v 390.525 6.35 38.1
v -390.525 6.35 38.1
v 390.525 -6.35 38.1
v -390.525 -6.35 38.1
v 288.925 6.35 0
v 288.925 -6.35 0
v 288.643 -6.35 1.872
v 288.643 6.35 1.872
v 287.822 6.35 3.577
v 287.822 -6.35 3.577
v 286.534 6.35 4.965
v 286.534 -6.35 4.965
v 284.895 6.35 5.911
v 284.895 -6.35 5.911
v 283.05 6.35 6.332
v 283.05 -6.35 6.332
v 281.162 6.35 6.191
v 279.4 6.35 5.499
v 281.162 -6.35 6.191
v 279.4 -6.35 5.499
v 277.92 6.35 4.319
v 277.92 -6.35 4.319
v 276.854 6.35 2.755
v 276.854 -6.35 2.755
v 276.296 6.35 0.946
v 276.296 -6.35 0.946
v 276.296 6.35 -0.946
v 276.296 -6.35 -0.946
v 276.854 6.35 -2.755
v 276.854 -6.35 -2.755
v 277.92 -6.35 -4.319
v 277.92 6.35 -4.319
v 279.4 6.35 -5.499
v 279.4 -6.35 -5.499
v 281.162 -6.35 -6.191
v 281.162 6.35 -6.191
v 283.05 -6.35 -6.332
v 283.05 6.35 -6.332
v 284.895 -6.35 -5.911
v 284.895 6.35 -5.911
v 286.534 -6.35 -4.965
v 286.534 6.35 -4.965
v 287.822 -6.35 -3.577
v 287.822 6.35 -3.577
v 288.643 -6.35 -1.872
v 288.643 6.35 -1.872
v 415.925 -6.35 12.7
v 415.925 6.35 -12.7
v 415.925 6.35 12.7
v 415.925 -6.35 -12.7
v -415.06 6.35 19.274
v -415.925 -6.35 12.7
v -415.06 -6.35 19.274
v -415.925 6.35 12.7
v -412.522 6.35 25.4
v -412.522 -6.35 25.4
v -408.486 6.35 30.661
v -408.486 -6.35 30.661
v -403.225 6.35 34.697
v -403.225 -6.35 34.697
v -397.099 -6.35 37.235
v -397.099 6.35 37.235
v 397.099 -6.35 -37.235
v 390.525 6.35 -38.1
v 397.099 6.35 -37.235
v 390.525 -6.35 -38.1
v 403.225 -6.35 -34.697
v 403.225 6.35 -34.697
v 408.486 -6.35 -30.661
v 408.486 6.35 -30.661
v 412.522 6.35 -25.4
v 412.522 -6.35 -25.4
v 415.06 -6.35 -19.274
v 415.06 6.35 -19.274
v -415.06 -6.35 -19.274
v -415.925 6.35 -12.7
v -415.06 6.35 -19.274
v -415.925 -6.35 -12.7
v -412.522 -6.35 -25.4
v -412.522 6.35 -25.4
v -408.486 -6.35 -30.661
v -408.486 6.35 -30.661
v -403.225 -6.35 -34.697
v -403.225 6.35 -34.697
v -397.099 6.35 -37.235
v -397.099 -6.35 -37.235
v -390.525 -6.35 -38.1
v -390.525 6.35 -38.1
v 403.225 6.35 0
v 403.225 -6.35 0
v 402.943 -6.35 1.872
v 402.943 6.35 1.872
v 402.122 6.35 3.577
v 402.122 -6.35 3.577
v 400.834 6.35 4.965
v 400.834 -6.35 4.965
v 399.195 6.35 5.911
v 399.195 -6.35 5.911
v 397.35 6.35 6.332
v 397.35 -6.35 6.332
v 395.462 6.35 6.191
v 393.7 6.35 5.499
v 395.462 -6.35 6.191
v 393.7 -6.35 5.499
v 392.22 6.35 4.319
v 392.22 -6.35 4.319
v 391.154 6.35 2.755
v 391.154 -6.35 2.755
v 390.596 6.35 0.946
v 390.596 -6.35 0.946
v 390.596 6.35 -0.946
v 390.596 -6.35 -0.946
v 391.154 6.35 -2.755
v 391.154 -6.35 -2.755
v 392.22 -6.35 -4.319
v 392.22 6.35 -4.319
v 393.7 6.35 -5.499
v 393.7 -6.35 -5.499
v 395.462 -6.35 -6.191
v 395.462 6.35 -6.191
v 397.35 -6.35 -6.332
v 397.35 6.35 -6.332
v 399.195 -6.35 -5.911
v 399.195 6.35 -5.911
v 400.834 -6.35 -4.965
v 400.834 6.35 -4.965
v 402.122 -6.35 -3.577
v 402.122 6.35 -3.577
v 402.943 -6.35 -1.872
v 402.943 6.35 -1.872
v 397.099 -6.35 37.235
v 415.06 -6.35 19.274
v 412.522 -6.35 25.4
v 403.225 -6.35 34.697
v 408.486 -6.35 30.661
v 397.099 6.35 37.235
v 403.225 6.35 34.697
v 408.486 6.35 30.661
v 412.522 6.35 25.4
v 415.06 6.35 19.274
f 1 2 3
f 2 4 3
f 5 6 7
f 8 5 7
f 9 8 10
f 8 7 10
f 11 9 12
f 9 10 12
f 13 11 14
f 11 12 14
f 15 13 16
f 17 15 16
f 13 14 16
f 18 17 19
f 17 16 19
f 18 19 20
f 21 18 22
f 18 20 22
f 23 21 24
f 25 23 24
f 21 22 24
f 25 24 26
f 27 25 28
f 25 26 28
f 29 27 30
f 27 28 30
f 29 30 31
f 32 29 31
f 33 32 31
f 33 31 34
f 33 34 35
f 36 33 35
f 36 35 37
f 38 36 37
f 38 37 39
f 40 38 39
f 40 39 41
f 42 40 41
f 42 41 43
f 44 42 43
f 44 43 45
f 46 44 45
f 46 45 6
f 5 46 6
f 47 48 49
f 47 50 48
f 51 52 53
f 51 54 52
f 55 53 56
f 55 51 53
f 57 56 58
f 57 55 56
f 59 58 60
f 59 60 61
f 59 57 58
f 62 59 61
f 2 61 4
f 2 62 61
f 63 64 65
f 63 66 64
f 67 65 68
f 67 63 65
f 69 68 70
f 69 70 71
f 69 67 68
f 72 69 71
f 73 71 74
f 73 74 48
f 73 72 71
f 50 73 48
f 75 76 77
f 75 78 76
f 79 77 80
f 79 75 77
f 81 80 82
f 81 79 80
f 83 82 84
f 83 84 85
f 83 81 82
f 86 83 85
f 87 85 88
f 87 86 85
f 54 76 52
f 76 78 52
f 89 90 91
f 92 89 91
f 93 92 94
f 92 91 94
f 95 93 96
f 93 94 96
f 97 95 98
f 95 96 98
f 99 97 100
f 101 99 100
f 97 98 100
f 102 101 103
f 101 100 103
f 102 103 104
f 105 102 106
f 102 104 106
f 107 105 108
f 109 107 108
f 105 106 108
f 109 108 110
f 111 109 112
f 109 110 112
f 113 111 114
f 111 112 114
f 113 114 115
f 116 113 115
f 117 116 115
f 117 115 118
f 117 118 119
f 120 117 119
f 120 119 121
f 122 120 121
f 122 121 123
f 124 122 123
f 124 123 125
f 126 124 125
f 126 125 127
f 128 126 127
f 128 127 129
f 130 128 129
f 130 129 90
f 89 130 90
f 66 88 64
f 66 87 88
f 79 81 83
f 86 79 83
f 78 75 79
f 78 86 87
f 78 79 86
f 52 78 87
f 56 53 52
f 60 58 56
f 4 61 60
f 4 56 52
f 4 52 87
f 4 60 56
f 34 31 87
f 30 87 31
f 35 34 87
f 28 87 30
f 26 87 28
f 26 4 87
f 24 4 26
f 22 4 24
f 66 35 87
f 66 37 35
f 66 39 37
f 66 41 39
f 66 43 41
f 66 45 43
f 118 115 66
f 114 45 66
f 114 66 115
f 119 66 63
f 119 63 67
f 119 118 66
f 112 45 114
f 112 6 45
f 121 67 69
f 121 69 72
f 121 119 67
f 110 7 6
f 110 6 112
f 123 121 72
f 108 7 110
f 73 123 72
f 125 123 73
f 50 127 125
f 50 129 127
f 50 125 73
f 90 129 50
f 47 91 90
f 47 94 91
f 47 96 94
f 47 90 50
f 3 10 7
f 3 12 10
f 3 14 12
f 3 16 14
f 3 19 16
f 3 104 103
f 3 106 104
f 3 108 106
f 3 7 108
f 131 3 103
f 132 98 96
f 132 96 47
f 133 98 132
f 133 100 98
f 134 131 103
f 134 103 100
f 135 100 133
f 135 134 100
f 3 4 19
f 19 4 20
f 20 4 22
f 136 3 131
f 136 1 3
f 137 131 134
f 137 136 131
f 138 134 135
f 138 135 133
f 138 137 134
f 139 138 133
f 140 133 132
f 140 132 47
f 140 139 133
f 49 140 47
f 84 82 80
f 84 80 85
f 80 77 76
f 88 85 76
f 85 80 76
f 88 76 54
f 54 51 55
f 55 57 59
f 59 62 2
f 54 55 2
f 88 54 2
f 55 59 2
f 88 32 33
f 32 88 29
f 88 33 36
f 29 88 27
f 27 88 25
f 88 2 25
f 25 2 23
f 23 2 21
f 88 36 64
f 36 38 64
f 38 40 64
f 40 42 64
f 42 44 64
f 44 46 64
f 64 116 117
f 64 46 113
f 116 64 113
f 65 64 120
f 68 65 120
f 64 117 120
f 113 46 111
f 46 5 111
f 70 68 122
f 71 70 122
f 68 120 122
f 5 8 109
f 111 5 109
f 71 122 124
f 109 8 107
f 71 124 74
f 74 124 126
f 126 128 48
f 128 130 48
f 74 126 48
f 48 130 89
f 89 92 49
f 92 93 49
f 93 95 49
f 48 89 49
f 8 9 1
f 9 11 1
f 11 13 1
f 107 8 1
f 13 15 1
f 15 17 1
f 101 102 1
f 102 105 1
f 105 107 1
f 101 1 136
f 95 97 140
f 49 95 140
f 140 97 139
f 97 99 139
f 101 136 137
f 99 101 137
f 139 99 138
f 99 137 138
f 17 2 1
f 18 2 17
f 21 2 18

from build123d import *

# Parameters (mm, degrees)
F0_W     = 831.85
F0_H     = 76.2
F1_DEPTH = 6.35
F2_R     = 6.35
F3_DEPTH = 25.4
F4_R     = 25.4


with BuildPart() as f1:
    # F0 (on Front) → F1 (new body, symmetric)
    with BuildSketch(Plane.XZ):
        Rectangle(F0_W, F0_H)
    extrude(amount=F1_DEPTH, both=True)

    # F2 (on face) → F3 (cut)
    with BuildSketch(Plane.XZ.offset(6.35)):
        with Locations((282.575, 0)):
            Circle(F2_R)
        with Locations((396.875, 0)):
            Circle(F2_R)
    extrude(amount=-F3_DEPTH, mode=Mode.SUBTRACT)

    # F4
    f4_edges = [f1.edges().sort_by_distance(p)[0] for p in [
        (-415.925, 0, 38.1),
        (-415.925, 0, -38.1),
        (415.925, 0, -38.1),
        (415.925, 0, 38.1),
    ]]
    fillet(f4_edges, radius=F4_R)


solid = f1.part
